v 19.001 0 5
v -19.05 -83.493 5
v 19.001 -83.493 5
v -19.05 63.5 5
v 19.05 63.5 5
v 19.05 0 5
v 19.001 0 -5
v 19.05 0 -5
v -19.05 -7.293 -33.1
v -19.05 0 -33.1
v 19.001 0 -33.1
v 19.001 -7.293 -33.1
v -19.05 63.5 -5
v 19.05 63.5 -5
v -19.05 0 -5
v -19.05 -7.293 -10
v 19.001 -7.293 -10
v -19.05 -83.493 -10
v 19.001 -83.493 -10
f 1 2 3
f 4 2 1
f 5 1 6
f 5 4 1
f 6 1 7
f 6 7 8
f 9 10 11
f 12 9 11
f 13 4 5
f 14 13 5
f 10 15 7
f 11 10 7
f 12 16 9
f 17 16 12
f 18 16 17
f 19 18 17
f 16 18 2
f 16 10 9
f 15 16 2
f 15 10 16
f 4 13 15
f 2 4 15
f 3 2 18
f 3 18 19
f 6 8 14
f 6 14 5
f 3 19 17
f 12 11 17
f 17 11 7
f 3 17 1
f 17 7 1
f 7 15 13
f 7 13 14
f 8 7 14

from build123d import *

# Parameters (mm, degrees)
F0_W     = 38.1
F0_H     = 10
F1_DEPTH = 63.5
F2_W     = 38.0510927618
F2_H     = 7.2934785858
F3_DEPTH = 38.1
F4_W     = 38.0510927618
F4_H     = 15
F5_DEPTH = 76.2


with BuildPart() as f1:
    # F0 (on Front) → F1 (new body)
    with BuildSketch(Plane.XZ):
        Rectangle(F0_W, F0_H)
    extrude(amount=-F1_DEPTH)

    # F2 (on face) → F3 (join)
    with BuildSketch(Plane.XY.offset(5)):
        with Locations((-0.0244536191, -3.6467392929)):
            Rectangle(F2_W, F2_H)
    extrude(amount=-F3_DEPTH)

    # F4 (on face) → F5 (join)
    with BuildSketch(Plane.XZ.offset(7.2934785858)):
        with Locations((-0.0244536191, -2.5)):
            Rectangle(F4_W, F4_H)
    extrude(amount=F5_DEPTH)


solid = f1.part
